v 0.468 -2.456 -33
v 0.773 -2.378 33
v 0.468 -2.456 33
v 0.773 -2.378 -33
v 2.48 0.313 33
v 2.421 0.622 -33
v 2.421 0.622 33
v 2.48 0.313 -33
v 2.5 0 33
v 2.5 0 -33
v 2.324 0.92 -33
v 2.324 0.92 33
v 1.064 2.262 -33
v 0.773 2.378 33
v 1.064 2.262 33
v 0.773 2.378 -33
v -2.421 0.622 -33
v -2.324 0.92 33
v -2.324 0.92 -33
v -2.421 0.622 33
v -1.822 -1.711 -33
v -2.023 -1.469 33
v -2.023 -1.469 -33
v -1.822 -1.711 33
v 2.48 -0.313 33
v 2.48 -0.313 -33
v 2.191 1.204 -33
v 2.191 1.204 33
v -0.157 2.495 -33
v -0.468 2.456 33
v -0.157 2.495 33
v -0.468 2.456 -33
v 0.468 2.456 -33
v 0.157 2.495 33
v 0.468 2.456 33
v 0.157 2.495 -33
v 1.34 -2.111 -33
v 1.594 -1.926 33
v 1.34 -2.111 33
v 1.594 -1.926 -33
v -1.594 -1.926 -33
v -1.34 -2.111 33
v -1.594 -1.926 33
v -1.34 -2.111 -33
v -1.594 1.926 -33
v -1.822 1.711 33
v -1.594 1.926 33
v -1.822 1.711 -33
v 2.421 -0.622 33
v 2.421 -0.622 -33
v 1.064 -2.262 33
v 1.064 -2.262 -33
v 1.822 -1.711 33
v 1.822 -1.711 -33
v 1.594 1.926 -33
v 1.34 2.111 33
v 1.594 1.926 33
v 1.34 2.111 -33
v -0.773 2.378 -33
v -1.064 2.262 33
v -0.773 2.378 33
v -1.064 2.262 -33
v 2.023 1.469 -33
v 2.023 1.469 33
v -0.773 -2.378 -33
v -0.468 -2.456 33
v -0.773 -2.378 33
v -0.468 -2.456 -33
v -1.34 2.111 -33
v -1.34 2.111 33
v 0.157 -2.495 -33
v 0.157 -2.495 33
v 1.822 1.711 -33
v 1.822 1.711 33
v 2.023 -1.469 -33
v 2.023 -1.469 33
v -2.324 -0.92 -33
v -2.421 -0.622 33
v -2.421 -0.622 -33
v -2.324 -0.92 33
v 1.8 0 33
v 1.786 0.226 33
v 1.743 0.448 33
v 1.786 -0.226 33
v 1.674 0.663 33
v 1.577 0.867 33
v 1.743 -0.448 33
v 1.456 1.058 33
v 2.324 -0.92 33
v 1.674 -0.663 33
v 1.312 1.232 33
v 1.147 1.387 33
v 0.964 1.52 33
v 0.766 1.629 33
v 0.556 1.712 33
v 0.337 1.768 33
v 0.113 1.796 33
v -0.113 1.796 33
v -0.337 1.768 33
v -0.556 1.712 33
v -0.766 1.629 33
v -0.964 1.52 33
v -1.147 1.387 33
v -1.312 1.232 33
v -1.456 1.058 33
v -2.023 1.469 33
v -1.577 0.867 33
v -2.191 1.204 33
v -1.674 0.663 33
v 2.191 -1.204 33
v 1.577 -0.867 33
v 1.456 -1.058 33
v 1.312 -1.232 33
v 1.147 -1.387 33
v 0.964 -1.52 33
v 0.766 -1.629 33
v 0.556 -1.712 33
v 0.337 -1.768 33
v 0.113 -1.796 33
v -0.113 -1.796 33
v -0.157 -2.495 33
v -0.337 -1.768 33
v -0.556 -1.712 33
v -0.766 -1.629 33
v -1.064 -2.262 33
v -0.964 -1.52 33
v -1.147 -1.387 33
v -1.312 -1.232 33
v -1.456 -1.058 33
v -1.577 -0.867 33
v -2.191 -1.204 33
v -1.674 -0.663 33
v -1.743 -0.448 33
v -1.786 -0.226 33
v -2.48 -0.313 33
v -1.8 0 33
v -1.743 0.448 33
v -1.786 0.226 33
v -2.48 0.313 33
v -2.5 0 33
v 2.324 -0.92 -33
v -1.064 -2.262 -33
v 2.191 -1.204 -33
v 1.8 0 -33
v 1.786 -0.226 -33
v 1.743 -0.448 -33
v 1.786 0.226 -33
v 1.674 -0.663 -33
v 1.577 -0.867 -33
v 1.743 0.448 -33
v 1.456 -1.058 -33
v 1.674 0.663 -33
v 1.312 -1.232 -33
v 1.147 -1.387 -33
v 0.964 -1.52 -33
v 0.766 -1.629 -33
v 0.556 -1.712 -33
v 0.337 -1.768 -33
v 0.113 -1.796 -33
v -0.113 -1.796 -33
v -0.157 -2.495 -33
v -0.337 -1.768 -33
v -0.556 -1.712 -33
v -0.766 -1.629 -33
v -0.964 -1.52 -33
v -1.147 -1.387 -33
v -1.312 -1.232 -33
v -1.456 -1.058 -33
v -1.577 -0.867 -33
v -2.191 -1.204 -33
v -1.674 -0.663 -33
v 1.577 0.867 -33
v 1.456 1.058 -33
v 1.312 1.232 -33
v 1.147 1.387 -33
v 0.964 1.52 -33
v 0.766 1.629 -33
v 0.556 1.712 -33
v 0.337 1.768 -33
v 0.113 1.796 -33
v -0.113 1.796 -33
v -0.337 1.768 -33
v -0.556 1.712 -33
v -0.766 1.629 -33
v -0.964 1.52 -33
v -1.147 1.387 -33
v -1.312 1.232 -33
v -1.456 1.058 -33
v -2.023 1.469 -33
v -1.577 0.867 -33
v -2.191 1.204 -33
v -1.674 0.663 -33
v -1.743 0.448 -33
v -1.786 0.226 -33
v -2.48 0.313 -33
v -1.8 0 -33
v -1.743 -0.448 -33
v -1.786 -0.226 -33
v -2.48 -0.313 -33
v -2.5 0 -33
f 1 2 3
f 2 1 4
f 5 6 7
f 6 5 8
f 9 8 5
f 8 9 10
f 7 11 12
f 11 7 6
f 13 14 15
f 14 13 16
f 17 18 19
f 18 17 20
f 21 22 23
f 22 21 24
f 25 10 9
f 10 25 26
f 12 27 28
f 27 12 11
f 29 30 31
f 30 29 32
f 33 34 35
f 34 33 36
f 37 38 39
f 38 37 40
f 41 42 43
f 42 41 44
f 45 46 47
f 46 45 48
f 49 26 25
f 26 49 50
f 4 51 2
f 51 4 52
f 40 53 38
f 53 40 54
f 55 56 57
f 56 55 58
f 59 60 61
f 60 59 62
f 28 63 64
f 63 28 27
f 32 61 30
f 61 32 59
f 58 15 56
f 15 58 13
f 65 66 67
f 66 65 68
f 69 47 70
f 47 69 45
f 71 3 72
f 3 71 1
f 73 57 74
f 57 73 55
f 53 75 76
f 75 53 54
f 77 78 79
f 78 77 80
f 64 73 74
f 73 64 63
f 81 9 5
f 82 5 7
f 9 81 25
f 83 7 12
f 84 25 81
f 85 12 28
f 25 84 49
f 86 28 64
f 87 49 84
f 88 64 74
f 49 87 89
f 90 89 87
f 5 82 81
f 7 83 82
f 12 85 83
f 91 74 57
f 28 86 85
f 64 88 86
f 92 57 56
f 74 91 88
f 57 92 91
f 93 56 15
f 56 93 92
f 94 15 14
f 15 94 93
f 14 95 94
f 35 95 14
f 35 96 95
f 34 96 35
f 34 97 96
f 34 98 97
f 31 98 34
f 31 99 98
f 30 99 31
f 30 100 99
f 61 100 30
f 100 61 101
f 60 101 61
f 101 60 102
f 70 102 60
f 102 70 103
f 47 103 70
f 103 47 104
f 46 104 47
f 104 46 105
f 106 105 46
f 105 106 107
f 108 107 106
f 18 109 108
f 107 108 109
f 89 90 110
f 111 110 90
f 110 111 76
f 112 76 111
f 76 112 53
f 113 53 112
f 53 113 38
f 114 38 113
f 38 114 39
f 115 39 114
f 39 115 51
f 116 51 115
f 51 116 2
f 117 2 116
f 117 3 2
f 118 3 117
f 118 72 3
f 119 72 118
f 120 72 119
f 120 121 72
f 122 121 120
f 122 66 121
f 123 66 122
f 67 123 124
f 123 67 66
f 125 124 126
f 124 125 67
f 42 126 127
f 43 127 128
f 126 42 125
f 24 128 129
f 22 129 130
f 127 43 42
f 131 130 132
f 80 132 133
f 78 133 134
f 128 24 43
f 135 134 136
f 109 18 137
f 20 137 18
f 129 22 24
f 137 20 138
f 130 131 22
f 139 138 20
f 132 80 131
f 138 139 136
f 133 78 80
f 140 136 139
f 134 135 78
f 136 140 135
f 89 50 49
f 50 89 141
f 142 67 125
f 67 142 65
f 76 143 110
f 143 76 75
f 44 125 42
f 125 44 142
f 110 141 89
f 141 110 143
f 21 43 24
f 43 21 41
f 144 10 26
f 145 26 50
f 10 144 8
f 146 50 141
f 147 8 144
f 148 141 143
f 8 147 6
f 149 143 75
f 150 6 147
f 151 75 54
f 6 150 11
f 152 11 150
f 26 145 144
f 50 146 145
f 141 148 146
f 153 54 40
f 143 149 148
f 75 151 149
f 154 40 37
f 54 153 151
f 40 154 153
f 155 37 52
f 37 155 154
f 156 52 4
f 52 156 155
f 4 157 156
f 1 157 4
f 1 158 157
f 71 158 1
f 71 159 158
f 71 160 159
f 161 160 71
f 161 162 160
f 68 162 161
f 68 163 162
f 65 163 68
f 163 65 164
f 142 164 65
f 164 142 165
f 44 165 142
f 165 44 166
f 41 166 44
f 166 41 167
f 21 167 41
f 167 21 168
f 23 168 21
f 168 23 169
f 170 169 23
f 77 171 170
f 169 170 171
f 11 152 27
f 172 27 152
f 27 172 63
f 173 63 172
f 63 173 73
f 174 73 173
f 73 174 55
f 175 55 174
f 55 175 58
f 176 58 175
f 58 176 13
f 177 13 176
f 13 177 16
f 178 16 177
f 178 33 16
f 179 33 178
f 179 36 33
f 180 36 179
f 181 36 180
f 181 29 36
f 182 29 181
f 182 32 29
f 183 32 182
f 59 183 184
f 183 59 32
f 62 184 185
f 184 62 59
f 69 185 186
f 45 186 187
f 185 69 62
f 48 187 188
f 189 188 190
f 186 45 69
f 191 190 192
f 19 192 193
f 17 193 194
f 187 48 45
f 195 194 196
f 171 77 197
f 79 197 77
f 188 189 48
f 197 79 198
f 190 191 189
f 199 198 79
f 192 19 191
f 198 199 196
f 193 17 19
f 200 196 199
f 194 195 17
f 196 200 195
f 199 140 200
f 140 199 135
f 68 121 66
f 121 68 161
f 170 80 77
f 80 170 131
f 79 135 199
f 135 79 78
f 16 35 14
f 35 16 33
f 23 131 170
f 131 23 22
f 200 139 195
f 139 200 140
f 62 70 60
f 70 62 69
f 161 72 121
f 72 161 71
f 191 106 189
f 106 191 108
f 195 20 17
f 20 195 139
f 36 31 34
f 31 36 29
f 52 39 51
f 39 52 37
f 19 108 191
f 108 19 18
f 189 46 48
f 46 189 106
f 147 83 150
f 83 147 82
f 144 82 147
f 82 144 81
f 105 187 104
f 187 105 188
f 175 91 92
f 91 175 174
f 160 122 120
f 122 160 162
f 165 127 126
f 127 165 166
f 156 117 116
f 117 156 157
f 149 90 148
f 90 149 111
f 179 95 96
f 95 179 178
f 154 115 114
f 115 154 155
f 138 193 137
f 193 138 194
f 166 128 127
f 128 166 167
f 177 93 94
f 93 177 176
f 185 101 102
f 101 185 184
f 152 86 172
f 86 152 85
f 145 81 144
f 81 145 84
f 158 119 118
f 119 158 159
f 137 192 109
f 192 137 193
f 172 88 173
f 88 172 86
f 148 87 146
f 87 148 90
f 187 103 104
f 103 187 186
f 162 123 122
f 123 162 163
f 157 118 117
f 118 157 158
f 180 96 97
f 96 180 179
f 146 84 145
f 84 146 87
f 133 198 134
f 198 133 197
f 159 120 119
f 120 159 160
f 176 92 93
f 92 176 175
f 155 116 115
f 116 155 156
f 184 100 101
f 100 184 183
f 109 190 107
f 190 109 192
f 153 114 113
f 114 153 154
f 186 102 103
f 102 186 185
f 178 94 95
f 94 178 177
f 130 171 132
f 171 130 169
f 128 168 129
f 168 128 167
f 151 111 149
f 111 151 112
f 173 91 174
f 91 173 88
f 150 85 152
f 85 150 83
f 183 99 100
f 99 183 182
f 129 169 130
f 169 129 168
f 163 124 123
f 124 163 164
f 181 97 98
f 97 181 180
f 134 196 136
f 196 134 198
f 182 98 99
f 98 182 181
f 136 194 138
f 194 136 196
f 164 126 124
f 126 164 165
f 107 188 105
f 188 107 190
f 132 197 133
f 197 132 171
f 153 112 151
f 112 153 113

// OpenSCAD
$fn = 50;


difference() {
	union() {
		translate(v = [0, 0, -33.0000000000]) {
			cylinder(h = 66, r = 2.5000000000);
		}
	}
	union() {
		#translate(v = [0, 0, -100.0000000000]) {
			cylinder(h = 200, r = 1.8000000000);
		}
	}
}
